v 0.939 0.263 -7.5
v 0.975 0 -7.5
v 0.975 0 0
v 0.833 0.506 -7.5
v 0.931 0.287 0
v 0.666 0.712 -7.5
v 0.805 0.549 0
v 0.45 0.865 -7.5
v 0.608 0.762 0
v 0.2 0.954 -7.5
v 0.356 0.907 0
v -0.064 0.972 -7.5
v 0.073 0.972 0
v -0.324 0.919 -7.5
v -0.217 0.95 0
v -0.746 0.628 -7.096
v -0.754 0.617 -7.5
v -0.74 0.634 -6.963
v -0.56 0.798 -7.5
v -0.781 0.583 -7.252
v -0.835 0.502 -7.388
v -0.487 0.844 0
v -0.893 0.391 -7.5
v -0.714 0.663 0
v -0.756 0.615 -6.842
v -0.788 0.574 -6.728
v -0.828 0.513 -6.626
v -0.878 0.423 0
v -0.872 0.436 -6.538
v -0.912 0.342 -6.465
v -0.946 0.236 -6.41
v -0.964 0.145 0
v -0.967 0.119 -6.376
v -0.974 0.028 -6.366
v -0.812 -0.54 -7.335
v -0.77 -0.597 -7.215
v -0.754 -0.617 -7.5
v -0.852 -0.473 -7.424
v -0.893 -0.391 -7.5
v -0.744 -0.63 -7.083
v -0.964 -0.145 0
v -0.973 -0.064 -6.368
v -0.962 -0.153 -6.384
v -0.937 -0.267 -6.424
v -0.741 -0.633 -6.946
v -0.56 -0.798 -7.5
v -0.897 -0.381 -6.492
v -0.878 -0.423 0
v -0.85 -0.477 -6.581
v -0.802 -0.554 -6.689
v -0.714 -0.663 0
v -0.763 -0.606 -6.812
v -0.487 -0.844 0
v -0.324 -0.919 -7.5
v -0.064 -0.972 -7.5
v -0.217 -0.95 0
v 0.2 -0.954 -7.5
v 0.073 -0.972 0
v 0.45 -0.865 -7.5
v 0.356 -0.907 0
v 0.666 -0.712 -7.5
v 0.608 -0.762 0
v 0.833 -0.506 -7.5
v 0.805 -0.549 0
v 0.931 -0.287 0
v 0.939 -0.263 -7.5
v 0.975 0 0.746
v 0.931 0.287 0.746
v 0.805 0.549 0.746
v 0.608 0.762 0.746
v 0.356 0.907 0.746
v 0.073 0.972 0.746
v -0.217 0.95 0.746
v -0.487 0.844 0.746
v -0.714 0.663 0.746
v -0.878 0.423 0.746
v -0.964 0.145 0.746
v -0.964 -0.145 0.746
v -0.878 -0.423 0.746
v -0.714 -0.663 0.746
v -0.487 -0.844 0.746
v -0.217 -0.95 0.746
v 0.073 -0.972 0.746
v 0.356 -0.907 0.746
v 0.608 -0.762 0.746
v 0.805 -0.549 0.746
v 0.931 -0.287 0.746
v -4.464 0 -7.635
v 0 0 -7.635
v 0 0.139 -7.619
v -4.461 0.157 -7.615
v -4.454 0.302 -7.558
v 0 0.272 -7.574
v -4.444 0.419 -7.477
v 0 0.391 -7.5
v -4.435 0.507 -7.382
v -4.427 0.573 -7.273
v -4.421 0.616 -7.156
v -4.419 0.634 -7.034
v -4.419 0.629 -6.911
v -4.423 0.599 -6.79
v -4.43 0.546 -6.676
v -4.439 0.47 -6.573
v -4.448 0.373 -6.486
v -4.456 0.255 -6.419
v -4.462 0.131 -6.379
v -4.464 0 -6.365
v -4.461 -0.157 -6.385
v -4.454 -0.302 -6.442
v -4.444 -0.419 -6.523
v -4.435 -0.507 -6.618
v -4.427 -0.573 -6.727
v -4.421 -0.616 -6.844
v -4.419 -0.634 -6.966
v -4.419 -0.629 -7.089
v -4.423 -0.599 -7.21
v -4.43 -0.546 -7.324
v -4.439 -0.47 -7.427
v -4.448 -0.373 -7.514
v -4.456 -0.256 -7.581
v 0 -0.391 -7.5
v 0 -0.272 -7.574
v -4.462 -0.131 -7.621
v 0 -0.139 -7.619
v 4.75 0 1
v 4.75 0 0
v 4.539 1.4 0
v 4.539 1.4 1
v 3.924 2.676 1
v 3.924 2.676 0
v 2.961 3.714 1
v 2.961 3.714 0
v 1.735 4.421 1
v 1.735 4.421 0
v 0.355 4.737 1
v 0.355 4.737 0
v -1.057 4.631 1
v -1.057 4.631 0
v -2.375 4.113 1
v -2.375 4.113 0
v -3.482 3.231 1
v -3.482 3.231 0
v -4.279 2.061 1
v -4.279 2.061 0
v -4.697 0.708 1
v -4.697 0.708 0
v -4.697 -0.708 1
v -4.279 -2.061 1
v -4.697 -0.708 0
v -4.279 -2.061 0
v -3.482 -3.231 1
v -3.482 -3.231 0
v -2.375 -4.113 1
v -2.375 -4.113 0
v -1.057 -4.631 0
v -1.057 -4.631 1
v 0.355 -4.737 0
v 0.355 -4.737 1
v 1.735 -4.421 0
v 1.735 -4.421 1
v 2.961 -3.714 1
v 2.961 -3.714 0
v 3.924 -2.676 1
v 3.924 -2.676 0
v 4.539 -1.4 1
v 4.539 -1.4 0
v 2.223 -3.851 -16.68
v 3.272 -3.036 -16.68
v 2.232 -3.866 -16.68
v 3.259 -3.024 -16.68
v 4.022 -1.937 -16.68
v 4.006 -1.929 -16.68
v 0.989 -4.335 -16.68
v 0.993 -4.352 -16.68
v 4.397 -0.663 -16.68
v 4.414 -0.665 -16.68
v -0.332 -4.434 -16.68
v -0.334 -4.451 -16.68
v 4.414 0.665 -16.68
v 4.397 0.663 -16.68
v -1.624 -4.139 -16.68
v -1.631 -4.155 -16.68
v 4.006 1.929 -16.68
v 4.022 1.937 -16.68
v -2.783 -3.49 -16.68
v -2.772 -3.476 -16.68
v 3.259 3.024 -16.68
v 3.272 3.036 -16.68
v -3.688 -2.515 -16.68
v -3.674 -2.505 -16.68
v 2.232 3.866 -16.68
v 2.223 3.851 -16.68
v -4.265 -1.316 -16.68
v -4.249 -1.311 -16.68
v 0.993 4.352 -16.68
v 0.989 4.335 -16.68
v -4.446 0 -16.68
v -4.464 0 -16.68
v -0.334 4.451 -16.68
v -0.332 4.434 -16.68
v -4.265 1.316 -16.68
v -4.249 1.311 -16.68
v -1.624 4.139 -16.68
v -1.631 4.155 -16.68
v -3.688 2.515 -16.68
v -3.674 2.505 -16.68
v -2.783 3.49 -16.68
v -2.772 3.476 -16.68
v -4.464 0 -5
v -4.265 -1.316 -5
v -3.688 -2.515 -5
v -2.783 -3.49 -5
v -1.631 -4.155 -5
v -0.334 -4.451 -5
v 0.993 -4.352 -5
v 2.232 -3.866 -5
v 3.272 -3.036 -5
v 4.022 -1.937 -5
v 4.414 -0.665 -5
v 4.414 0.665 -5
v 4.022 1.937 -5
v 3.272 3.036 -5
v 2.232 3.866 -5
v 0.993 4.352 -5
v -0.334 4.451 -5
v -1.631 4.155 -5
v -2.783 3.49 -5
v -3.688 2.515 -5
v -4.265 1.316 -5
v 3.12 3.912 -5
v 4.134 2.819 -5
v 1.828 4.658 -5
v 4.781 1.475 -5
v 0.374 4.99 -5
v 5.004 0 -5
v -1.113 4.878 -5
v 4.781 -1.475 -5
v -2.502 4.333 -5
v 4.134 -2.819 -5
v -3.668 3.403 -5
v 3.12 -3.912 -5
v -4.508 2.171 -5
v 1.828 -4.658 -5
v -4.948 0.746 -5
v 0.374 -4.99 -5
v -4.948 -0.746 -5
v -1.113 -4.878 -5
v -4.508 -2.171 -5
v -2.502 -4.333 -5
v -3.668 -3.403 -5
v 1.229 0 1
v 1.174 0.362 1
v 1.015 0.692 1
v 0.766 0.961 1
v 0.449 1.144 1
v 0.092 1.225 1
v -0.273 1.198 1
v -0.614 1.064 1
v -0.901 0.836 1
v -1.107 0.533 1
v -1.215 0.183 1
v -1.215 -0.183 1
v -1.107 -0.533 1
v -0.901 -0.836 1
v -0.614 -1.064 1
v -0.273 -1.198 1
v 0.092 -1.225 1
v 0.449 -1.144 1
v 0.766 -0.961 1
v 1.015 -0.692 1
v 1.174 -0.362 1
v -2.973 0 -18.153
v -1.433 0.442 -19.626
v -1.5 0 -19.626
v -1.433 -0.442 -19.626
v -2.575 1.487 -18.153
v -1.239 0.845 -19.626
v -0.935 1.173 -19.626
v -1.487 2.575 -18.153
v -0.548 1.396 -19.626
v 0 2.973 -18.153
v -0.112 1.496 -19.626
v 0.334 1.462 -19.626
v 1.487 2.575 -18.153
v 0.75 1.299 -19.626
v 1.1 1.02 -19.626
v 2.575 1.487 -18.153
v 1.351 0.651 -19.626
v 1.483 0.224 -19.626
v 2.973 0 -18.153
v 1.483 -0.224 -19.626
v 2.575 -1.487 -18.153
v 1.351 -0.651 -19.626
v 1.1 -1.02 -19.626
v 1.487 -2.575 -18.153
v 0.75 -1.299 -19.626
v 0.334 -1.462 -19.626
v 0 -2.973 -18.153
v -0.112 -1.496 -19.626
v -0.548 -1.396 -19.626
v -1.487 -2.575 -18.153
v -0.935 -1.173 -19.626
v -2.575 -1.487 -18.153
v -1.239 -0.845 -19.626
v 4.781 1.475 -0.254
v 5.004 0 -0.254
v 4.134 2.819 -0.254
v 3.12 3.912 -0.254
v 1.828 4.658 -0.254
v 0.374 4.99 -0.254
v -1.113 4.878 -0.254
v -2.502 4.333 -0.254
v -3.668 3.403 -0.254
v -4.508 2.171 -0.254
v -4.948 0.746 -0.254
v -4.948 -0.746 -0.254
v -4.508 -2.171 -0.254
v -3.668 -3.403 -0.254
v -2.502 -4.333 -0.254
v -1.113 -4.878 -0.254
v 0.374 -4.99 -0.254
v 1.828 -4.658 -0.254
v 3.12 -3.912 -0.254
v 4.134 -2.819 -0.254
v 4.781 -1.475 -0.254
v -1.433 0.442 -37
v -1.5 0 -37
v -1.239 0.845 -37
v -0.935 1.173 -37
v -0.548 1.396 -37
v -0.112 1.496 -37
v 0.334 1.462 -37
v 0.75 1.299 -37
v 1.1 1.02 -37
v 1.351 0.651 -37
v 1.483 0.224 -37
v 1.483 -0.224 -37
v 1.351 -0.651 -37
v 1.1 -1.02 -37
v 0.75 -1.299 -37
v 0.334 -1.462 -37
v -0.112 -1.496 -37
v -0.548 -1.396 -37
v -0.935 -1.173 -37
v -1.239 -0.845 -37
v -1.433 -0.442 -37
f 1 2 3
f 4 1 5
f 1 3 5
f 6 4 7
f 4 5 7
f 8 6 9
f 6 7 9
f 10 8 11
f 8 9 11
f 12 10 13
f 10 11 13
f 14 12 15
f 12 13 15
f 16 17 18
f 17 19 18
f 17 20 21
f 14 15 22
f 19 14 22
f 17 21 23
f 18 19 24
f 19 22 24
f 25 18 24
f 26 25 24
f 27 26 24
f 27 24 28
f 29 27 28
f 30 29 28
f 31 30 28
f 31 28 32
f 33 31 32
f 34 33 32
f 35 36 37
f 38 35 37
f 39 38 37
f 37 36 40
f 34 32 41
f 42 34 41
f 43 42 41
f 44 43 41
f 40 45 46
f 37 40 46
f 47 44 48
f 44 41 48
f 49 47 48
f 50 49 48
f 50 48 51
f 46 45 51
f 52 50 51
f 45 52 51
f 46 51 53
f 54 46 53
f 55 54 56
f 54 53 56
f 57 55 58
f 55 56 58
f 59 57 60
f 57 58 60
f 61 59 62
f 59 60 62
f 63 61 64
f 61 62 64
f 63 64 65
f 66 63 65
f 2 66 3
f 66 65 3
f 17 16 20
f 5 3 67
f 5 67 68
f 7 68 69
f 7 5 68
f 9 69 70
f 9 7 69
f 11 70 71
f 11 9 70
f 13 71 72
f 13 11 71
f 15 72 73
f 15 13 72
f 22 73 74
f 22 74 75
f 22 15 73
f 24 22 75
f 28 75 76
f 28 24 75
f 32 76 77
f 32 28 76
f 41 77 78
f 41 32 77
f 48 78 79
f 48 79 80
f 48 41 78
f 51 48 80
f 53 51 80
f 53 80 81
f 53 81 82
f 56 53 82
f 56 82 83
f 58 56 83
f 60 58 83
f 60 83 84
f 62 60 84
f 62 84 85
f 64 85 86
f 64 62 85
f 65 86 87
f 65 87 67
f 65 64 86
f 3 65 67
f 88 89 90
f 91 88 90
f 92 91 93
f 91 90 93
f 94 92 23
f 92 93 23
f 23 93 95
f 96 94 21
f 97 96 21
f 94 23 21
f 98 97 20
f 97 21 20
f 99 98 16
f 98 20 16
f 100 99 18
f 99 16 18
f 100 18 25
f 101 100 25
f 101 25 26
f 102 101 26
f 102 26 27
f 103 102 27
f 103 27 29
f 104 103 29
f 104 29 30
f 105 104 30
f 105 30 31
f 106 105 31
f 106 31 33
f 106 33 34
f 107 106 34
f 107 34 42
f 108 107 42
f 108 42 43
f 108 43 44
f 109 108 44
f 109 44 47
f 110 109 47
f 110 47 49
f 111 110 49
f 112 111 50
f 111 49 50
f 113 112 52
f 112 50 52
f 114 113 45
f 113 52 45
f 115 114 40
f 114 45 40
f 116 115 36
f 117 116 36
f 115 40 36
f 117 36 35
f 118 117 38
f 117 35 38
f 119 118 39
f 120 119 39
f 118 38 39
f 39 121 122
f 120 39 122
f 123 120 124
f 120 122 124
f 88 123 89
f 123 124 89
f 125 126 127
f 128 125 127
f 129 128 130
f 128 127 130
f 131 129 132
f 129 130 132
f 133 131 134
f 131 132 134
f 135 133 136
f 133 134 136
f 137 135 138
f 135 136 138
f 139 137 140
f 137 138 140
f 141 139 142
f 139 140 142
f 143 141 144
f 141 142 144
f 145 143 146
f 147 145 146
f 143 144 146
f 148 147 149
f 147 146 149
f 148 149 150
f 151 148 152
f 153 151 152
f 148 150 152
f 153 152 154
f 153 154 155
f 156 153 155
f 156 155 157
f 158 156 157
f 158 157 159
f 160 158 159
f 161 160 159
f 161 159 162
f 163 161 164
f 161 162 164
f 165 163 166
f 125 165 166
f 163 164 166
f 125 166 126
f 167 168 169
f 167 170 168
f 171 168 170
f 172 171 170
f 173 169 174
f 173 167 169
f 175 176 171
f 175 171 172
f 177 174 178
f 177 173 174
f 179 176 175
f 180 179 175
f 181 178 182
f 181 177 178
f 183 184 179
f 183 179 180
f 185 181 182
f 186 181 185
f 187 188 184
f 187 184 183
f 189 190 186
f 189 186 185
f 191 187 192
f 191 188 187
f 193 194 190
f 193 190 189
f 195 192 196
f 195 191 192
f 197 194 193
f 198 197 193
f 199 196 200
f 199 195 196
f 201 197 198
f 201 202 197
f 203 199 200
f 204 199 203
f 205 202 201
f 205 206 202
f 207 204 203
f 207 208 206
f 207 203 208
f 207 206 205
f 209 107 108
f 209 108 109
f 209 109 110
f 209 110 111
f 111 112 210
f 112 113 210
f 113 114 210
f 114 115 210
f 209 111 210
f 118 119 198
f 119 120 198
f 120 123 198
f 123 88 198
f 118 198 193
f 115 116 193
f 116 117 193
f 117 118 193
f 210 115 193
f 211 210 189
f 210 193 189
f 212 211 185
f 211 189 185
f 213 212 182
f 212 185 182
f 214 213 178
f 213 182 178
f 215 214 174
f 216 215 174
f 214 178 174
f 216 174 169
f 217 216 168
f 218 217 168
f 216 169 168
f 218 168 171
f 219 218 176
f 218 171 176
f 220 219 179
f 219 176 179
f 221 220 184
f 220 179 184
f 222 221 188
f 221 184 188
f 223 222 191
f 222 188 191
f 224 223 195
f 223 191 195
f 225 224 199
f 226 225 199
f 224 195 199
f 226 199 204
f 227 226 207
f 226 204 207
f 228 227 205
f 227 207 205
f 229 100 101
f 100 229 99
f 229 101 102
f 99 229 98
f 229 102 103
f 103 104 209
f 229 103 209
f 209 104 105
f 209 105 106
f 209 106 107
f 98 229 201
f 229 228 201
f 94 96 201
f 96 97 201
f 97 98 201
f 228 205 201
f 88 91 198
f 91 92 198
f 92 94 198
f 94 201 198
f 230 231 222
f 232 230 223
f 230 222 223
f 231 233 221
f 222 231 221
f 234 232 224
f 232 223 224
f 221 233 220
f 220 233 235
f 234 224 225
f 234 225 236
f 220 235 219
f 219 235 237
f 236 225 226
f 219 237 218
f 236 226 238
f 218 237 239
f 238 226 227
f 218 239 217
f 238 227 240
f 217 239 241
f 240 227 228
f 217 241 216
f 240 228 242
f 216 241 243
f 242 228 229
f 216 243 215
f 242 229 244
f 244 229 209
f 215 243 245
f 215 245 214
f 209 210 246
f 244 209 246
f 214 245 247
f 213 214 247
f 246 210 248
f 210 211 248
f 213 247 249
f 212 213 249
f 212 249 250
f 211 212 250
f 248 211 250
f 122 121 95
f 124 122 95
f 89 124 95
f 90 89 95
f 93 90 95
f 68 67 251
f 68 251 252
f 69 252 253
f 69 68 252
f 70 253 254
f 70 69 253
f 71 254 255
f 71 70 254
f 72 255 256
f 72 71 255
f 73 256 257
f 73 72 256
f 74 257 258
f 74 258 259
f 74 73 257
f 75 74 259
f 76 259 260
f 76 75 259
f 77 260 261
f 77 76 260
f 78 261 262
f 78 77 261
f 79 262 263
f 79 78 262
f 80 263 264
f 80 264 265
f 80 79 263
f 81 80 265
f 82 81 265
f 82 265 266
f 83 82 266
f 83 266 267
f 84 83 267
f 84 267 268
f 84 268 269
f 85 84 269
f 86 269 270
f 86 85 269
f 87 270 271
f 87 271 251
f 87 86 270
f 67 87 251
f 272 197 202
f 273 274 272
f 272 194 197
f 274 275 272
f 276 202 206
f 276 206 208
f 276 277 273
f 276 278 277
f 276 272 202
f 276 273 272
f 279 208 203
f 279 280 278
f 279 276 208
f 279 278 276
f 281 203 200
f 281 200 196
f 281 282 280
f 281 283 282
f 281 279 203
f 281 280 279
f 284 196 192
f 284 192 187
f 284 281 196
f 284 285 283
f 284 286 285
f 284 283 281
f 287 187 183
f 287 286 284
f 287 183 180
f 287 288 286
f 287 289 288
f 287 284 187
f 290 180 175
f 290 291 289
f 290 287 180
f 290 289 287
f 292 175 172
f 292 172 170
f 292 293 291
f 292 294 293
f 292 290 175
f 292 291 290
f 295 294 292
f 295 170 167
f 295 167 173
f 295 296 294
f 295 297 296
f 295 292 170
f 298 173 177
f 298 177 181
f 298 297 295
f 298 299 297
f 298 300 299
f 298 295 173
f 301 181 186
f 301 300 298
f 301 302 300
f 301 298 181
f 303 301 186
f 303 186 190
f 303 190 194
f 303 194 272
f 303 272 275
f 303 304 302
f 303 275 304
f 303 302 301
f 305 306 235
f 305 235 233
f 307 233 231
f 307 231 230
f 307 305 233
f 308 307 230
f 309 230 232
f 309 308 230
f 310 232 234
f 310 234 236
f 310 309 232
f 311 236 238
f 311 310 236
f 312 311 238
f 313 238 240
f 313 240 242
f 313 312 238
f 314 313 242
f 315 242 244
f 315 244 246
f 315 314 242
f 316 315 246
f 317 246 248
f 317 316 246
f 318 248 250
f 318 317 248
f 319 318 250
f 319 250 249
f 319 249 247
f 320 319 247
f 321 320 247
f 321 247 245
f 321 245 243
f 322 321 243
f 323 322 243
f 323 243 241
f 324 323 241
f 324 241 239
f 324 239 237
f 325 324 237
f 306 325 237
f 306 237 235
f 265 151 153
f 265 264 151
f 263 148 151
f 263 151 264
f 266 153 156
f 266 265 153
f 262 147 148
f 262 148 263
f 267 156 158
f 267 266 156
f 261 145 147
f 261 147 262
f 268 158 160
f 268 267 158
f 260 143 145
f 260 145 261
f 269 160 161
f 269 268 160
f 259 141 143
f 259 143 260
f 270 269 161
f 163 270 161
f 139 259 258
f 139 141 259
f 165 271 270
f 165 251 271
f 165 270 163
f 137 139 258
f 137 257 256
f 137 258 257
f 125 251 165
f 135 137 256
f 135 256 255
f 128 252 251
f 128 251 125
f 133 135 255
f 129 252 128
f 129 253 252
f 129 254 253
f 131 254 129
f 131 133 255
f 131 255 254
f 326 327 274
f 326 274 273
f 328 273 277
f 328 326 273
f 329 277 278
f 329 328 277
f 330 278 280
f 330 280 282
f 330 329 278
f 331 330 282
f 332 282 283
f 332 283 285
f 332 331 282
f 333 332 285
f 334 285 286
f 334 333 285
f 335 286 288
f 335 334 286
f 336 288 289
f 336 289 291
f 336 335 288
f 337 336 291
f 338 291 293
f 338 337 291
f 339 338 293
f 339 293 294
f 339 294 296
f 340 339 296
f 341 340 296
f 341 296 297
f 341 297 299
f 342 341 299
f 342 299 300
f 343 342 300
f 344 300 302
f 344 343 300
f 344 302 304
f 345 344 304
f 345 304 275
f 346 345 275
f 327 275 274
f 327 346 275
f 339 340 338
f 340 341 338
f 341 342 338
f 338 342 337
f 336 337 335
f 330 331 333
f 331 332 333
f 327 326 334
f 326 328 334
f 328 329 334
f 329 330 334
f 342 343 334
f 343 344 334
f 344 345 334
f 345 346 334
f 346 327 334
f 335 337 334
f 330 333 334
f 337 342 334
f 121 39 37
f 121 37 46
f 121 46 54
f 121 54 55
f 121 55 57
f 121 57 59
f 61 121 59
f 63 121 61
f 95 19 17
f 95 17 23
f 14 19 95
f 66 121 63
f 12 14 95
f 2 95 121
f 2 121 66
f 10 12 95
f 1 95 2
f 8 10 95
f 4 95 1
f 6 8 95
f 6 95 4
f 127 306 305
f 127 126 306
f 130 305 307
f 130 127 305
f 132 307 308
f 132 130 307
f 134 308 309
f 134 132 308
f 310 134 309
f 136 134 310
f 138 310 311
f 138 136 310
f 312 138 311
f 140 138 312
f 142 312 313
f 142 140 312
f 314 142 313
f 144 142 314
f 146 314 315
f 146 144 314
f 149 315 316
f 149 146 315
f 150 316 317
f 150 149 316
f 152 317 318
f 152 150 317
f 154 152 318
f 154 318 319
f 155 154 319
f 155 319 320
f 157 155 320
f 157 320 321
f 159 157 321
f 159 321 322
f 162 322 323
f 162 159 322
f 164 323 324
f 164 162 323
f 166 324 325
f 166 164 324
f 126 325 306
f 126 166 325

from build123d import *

# Parameters (mm, degrees)
SKETCH1_R           = 5.0038
EXTRUDE1_DEPTH      = 37
SKETCH2_R           = 0.974600032
EXTRUDE2_DEPTH      = 7.5
SKETCH3_OUTSIDE_W   = 19.93
SKETCH3_OUTSIDE_H   = 19.93
SKETCH3_OUTSIDE_R   = 1.5
EXTRUDE3_DEPTH      = 20.32
SKETCH5_R           = 0.635
EXTRUDE4_DEPTH      = 20.32
CHAMFER2_SIZE       = 0.254
SKETCH6_W           = 0.539999936
SKETCH6_H           = 11.68
CHAMFER3_SIZE       = 2.9464
SKETCH8_R           = 4.7498
SKETCH8_R_2         = 0.974600032
BOSS_EXTRUDE1_DEPTH = 1
CHAMFER4_SIZE       = 0.254


with BuildPart() as part:
    # Sketch1 → Extrude1 (new body)
    with BuildSketch(Plane.XY):
        Circle(SKETCH1_R)
    extrude(amount=-EXTRUDE1_DEPTH)

    # Sketch2 → Extrude2 (cut)
    with BuildSketch(Plane.XY):
        Circle(SKETCH2_R)
    extrude(amount=-EXTRUDE2_DEPTH, mode=Mode.SUBTRACT)

    # Sketch3 outside → Extrude3 (cut)
    with BuildSketch(Plane(origin=(0, 0, -37), x_dir=(-1, 0, 0), z_dir=(0, 0, -1))):
        Rectangle(SKETCH3_OUTSIDE_W, SKETCH3_OUTSIDE_H)
        Circle(SKETCH3_OUTSIDE_R, mode=Mode.SUBTRACT)
    extrude(amount=-EXTRUDE3_DEPTH, mode=Mode.SUBTRACT)

    # Sketch5 → Extrude4 (cut)
    with BuildSketch(Plane(origin=(0, 0, 0), x_dir=(0, 0, -1), z_dir=(1, 0, 0))):
        with Locations((7, 0)):
            Circle(SKETCH5_R)
    extrude(amount=-EXTRUDE4_DEPTH, mode=Mode.SUBTRACT)

    # Chamfer2
    chamfer2_edges = [part.edges().sort_by_distance(p)[0] for p in [
        (-5.0038, 0, 0),
    ]]
    chamfer(chamfer2_edges, length=CHAMFER2_SIZE)

    # Sketch6 → Cut-Revolve1 (revolve, cut)
    with BuildSketch(Plane(origin=(0, 0, 0), x_dir=(1, 0, 0), z_dir=(0, 1, 0))):
        with Locations((-4.733800032, 10.84)):
            Rectangle(SKETCH6_W, SKETCH6_H)
    revolve(axis=Axis((0, 0, -37), (0, 0, 1)), mode=Mode.SUBTRACT)

    # Chamfer3
    chamfer3_edges = [part.edges().sort_by_distance(p)[0] for p in [
        (1.5, 0, -16.68),
    ]]
    chamfer(chamfer3_edges, length=CHAMFER3_SIZE)

    # Sketch8 → Boss-Extrude1 (add)
    with BuildSketch(Plane.XY):
        Circle(SKETCH8_R)
        Circle(SKETCH8_R_2, mode=Mode.SUBTRACT)
    extrude(amount=BOSS_EXTRUDE1_DEPTH)

    # Chamfer4
    chamfer4_edges = [part.edges().sort_by_distance(p)[0] for p in [
        (-0.974600032, 0, 1),
    ]]
    chamfer(chamfer4_edges, length=CHAMFER4_SIZE)


solid = part.part
